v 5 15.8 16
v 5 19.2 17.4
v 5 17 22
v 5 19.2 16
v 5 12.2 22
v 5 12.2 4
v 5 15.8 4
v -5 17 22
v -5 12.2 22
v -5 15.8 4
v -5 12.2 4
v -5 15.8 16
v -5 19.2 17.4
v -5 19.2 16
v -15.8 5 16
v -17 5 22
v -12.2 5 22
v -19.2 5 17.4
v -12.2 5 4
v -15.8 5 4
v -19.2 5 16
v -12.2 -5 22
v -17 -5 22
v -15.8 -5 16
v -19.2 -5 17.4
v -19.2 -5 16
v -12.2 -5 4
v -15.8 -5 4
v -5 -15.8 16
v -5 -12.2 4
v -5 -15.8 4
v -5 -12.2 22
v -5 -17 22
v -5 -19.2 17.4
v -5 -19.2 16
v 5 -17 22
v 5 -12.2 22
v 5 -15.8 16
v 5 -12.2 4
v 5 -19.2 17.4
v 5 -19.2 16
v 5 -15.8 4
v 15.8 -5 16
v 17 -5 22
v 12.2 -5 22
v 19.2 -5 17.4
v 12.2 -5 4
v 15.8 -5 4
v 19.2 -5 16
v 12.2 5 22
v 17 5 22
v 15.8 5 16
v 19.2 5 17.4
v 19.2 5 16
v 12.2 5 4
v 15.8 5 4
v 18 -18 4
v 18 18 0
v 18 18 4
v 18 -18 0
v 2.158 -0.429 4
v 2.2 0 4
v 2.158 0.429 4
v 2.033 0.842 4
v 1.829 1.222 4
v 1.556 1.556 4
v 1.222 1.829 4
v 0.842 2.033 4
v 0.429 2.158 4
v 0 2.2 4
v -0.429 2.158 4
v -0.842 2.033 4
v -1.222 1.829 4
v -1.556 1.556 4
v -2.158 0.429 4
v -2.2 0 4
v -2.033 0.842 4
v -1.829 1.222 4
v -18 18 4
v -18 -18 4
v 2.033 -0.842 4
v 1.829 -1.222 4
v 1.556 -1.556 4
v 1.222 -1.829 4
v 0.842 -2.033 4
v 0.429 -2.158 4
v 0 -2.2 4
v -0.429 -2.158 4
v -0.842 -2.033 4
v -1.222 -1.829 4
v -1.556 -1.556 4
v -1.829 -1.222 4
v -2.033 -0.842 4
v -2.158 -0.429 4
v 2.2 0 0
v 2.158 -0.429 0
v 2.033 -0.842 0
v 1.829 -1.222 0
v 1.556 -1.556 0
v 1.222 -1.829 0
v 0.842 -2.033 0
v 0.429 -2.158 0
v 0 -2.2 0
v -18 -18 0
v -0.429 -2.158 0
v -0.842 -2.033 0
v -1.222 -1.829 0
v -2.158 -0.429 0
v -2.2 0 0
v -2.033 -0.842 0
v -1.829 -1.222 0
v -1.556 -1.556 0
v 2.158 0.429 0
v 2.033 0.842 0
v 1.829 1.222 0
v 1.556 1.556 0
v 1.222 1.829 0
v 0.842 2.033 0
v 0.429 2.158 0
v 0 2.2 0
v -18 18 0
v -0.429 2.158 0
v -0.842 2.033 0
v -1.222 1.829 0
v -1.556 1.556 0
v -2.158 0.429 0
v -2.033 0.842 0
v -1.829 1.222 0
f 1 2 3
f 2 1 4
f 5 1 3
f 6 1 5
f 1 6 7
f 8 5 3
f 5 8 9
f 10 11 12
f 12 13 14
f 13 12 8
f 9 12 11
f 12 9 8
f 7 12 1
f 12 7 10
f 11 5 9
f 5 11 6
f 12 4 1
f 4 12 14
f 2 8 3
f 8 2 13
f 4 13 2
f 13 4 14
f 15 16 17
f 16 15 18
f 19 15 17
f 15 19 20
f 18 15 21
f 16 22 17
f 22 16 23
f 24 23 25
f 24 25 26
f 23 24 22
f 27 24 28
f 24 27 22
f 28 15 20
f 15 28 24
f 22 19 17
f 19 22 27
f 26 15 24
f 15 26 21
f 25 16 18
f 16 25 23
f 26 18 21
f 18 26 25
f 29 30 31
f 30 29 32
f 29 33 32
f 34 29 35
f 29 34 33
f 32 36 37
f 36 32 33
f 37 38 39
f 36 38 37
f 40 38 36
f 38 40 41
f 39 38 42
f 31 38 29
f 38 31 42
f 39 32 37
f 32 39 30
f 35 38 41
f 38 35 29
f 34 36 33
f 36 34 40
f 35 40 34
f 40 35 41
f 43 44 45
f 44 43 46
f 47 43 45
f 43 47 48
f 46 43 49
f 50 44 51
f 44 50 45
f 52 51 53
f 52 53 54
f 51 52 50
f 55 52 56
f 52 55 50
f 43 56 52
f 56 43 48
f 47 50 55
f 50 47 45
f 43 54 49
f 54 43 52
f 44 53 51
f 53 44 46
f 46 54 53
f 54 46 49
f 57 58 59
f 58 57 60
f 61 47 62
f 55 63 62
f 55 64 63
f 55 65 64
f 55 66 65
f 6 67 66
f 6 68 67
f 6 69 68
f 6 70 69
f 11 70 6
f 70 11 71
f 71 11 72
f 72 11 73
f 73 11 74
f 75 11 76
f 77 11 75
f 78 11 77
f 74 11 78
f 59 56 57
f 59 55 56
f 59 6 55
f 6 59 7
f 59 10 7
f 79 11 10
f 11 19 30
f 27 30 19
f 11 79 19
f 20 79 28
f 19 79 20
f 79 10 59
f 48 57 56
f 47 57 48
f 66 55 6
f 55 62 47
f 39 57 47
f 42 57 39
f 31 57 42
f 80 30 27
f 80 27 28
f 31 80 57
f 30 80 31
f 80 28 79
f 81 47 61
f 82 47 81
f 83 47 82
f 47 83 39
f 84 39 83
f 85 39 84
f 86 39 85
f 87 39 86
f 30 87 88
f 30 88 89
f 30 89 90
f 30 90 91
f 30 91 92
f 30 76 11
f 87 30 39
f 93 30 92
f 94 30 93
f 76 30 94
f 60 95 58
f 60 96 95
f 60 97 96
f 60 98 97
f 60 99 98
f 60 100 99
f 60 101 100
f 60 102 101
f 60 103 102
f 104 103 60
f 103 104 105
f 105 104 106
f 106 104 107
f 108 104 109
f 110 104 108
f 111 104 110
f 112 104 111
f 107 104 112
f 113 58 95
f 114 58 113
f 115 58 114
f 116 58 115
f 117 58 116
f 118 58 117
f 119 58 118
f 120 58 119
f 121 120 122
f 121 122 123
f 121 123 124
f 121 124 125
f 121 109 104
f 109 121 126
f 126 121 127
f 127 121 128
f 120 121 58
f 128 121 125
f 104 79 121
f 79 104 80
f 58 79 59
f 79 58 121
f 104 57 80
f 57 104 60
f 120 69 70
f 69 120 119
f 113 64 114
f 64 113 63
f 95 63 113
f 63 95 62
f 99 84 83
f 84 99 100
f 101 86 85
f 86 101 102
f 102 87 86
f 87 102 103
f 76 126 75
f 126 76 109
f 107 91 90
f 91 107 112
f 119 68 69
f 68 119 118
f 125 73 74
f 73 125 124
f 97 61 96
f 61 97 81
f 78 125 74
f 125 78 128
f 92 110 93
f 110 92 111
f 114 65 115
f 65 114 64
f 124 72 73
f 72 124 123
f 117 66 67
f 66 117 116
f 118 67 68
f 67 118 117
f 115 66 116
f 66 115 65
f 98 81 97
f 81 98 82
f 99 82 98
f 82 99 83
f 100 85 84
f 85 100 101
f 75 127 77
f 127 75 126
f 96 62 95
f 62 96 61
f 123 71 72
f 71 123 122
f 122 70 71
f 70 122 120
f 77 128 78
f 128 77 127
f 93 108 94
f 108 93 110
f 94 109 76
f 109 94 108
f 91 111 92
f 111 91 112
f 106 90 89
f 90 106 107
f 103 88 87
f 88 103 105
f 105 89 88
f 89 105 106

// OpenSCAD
$fn = 32;

// ----------------------------------------------------------------------
// Snap-fit latch: 4 arms, 18 mm tall, 3.6 mm undercut hooks
// ----------------------------------------------------------------------

// --- parameters (mm) ---
base_d = 36;              // base plate depth
base_h = 4;               // base plate thickness
span = 28;                // distance between opposite arms
arm_t = 3.6;              // arm thickness
arm_d = 10;               // arm width
height = 18;              // free arm length
head_len = 3.6;           // hook reach
head_h = 6;               // hook height
lead = 1.4;               // lead-in ramp thickness
bore_d = 4.4;             // base fixing bore
top_z = 22;               // height of the arm tips above the base

arms = 4;

difference() {
  union() {
    /* base plate, centred on the arm ring */
    translate([-18, -18, 0]) cube([base_d, base_d, base_h]);
    for (a = [0 : 360 / arms : 359]) rotate([0, 0, a]) {
    /* arm, sunk 0.5 mm into the base */
    translate([-arm_d / 2, span / 2 - arm_t / 2, base_h - 0.5]) cube([arm_d, arm_t, height + 0.5]);
    /* hook: a convex hull of a tall inner block and a thin outer lip
       gives a flat undercut below and a lead-in ramp on top */
    hull() {
      translate([-arm_d / 2, span / 2 + arm_t / 2 - 0.6, top_z - head_h]) cube([arm_d, lead + 0.4, head_h]);
      translate([-arm_d / 2, span / 2 + arm_t / 2 - 0.2, top_z - head_h]) cube([arm_d, head_len, lead]);
    }
    }
  }
  translate([0, 0, -2.5]) cylinder(h = base_h + 5, d = bore_d);
}
